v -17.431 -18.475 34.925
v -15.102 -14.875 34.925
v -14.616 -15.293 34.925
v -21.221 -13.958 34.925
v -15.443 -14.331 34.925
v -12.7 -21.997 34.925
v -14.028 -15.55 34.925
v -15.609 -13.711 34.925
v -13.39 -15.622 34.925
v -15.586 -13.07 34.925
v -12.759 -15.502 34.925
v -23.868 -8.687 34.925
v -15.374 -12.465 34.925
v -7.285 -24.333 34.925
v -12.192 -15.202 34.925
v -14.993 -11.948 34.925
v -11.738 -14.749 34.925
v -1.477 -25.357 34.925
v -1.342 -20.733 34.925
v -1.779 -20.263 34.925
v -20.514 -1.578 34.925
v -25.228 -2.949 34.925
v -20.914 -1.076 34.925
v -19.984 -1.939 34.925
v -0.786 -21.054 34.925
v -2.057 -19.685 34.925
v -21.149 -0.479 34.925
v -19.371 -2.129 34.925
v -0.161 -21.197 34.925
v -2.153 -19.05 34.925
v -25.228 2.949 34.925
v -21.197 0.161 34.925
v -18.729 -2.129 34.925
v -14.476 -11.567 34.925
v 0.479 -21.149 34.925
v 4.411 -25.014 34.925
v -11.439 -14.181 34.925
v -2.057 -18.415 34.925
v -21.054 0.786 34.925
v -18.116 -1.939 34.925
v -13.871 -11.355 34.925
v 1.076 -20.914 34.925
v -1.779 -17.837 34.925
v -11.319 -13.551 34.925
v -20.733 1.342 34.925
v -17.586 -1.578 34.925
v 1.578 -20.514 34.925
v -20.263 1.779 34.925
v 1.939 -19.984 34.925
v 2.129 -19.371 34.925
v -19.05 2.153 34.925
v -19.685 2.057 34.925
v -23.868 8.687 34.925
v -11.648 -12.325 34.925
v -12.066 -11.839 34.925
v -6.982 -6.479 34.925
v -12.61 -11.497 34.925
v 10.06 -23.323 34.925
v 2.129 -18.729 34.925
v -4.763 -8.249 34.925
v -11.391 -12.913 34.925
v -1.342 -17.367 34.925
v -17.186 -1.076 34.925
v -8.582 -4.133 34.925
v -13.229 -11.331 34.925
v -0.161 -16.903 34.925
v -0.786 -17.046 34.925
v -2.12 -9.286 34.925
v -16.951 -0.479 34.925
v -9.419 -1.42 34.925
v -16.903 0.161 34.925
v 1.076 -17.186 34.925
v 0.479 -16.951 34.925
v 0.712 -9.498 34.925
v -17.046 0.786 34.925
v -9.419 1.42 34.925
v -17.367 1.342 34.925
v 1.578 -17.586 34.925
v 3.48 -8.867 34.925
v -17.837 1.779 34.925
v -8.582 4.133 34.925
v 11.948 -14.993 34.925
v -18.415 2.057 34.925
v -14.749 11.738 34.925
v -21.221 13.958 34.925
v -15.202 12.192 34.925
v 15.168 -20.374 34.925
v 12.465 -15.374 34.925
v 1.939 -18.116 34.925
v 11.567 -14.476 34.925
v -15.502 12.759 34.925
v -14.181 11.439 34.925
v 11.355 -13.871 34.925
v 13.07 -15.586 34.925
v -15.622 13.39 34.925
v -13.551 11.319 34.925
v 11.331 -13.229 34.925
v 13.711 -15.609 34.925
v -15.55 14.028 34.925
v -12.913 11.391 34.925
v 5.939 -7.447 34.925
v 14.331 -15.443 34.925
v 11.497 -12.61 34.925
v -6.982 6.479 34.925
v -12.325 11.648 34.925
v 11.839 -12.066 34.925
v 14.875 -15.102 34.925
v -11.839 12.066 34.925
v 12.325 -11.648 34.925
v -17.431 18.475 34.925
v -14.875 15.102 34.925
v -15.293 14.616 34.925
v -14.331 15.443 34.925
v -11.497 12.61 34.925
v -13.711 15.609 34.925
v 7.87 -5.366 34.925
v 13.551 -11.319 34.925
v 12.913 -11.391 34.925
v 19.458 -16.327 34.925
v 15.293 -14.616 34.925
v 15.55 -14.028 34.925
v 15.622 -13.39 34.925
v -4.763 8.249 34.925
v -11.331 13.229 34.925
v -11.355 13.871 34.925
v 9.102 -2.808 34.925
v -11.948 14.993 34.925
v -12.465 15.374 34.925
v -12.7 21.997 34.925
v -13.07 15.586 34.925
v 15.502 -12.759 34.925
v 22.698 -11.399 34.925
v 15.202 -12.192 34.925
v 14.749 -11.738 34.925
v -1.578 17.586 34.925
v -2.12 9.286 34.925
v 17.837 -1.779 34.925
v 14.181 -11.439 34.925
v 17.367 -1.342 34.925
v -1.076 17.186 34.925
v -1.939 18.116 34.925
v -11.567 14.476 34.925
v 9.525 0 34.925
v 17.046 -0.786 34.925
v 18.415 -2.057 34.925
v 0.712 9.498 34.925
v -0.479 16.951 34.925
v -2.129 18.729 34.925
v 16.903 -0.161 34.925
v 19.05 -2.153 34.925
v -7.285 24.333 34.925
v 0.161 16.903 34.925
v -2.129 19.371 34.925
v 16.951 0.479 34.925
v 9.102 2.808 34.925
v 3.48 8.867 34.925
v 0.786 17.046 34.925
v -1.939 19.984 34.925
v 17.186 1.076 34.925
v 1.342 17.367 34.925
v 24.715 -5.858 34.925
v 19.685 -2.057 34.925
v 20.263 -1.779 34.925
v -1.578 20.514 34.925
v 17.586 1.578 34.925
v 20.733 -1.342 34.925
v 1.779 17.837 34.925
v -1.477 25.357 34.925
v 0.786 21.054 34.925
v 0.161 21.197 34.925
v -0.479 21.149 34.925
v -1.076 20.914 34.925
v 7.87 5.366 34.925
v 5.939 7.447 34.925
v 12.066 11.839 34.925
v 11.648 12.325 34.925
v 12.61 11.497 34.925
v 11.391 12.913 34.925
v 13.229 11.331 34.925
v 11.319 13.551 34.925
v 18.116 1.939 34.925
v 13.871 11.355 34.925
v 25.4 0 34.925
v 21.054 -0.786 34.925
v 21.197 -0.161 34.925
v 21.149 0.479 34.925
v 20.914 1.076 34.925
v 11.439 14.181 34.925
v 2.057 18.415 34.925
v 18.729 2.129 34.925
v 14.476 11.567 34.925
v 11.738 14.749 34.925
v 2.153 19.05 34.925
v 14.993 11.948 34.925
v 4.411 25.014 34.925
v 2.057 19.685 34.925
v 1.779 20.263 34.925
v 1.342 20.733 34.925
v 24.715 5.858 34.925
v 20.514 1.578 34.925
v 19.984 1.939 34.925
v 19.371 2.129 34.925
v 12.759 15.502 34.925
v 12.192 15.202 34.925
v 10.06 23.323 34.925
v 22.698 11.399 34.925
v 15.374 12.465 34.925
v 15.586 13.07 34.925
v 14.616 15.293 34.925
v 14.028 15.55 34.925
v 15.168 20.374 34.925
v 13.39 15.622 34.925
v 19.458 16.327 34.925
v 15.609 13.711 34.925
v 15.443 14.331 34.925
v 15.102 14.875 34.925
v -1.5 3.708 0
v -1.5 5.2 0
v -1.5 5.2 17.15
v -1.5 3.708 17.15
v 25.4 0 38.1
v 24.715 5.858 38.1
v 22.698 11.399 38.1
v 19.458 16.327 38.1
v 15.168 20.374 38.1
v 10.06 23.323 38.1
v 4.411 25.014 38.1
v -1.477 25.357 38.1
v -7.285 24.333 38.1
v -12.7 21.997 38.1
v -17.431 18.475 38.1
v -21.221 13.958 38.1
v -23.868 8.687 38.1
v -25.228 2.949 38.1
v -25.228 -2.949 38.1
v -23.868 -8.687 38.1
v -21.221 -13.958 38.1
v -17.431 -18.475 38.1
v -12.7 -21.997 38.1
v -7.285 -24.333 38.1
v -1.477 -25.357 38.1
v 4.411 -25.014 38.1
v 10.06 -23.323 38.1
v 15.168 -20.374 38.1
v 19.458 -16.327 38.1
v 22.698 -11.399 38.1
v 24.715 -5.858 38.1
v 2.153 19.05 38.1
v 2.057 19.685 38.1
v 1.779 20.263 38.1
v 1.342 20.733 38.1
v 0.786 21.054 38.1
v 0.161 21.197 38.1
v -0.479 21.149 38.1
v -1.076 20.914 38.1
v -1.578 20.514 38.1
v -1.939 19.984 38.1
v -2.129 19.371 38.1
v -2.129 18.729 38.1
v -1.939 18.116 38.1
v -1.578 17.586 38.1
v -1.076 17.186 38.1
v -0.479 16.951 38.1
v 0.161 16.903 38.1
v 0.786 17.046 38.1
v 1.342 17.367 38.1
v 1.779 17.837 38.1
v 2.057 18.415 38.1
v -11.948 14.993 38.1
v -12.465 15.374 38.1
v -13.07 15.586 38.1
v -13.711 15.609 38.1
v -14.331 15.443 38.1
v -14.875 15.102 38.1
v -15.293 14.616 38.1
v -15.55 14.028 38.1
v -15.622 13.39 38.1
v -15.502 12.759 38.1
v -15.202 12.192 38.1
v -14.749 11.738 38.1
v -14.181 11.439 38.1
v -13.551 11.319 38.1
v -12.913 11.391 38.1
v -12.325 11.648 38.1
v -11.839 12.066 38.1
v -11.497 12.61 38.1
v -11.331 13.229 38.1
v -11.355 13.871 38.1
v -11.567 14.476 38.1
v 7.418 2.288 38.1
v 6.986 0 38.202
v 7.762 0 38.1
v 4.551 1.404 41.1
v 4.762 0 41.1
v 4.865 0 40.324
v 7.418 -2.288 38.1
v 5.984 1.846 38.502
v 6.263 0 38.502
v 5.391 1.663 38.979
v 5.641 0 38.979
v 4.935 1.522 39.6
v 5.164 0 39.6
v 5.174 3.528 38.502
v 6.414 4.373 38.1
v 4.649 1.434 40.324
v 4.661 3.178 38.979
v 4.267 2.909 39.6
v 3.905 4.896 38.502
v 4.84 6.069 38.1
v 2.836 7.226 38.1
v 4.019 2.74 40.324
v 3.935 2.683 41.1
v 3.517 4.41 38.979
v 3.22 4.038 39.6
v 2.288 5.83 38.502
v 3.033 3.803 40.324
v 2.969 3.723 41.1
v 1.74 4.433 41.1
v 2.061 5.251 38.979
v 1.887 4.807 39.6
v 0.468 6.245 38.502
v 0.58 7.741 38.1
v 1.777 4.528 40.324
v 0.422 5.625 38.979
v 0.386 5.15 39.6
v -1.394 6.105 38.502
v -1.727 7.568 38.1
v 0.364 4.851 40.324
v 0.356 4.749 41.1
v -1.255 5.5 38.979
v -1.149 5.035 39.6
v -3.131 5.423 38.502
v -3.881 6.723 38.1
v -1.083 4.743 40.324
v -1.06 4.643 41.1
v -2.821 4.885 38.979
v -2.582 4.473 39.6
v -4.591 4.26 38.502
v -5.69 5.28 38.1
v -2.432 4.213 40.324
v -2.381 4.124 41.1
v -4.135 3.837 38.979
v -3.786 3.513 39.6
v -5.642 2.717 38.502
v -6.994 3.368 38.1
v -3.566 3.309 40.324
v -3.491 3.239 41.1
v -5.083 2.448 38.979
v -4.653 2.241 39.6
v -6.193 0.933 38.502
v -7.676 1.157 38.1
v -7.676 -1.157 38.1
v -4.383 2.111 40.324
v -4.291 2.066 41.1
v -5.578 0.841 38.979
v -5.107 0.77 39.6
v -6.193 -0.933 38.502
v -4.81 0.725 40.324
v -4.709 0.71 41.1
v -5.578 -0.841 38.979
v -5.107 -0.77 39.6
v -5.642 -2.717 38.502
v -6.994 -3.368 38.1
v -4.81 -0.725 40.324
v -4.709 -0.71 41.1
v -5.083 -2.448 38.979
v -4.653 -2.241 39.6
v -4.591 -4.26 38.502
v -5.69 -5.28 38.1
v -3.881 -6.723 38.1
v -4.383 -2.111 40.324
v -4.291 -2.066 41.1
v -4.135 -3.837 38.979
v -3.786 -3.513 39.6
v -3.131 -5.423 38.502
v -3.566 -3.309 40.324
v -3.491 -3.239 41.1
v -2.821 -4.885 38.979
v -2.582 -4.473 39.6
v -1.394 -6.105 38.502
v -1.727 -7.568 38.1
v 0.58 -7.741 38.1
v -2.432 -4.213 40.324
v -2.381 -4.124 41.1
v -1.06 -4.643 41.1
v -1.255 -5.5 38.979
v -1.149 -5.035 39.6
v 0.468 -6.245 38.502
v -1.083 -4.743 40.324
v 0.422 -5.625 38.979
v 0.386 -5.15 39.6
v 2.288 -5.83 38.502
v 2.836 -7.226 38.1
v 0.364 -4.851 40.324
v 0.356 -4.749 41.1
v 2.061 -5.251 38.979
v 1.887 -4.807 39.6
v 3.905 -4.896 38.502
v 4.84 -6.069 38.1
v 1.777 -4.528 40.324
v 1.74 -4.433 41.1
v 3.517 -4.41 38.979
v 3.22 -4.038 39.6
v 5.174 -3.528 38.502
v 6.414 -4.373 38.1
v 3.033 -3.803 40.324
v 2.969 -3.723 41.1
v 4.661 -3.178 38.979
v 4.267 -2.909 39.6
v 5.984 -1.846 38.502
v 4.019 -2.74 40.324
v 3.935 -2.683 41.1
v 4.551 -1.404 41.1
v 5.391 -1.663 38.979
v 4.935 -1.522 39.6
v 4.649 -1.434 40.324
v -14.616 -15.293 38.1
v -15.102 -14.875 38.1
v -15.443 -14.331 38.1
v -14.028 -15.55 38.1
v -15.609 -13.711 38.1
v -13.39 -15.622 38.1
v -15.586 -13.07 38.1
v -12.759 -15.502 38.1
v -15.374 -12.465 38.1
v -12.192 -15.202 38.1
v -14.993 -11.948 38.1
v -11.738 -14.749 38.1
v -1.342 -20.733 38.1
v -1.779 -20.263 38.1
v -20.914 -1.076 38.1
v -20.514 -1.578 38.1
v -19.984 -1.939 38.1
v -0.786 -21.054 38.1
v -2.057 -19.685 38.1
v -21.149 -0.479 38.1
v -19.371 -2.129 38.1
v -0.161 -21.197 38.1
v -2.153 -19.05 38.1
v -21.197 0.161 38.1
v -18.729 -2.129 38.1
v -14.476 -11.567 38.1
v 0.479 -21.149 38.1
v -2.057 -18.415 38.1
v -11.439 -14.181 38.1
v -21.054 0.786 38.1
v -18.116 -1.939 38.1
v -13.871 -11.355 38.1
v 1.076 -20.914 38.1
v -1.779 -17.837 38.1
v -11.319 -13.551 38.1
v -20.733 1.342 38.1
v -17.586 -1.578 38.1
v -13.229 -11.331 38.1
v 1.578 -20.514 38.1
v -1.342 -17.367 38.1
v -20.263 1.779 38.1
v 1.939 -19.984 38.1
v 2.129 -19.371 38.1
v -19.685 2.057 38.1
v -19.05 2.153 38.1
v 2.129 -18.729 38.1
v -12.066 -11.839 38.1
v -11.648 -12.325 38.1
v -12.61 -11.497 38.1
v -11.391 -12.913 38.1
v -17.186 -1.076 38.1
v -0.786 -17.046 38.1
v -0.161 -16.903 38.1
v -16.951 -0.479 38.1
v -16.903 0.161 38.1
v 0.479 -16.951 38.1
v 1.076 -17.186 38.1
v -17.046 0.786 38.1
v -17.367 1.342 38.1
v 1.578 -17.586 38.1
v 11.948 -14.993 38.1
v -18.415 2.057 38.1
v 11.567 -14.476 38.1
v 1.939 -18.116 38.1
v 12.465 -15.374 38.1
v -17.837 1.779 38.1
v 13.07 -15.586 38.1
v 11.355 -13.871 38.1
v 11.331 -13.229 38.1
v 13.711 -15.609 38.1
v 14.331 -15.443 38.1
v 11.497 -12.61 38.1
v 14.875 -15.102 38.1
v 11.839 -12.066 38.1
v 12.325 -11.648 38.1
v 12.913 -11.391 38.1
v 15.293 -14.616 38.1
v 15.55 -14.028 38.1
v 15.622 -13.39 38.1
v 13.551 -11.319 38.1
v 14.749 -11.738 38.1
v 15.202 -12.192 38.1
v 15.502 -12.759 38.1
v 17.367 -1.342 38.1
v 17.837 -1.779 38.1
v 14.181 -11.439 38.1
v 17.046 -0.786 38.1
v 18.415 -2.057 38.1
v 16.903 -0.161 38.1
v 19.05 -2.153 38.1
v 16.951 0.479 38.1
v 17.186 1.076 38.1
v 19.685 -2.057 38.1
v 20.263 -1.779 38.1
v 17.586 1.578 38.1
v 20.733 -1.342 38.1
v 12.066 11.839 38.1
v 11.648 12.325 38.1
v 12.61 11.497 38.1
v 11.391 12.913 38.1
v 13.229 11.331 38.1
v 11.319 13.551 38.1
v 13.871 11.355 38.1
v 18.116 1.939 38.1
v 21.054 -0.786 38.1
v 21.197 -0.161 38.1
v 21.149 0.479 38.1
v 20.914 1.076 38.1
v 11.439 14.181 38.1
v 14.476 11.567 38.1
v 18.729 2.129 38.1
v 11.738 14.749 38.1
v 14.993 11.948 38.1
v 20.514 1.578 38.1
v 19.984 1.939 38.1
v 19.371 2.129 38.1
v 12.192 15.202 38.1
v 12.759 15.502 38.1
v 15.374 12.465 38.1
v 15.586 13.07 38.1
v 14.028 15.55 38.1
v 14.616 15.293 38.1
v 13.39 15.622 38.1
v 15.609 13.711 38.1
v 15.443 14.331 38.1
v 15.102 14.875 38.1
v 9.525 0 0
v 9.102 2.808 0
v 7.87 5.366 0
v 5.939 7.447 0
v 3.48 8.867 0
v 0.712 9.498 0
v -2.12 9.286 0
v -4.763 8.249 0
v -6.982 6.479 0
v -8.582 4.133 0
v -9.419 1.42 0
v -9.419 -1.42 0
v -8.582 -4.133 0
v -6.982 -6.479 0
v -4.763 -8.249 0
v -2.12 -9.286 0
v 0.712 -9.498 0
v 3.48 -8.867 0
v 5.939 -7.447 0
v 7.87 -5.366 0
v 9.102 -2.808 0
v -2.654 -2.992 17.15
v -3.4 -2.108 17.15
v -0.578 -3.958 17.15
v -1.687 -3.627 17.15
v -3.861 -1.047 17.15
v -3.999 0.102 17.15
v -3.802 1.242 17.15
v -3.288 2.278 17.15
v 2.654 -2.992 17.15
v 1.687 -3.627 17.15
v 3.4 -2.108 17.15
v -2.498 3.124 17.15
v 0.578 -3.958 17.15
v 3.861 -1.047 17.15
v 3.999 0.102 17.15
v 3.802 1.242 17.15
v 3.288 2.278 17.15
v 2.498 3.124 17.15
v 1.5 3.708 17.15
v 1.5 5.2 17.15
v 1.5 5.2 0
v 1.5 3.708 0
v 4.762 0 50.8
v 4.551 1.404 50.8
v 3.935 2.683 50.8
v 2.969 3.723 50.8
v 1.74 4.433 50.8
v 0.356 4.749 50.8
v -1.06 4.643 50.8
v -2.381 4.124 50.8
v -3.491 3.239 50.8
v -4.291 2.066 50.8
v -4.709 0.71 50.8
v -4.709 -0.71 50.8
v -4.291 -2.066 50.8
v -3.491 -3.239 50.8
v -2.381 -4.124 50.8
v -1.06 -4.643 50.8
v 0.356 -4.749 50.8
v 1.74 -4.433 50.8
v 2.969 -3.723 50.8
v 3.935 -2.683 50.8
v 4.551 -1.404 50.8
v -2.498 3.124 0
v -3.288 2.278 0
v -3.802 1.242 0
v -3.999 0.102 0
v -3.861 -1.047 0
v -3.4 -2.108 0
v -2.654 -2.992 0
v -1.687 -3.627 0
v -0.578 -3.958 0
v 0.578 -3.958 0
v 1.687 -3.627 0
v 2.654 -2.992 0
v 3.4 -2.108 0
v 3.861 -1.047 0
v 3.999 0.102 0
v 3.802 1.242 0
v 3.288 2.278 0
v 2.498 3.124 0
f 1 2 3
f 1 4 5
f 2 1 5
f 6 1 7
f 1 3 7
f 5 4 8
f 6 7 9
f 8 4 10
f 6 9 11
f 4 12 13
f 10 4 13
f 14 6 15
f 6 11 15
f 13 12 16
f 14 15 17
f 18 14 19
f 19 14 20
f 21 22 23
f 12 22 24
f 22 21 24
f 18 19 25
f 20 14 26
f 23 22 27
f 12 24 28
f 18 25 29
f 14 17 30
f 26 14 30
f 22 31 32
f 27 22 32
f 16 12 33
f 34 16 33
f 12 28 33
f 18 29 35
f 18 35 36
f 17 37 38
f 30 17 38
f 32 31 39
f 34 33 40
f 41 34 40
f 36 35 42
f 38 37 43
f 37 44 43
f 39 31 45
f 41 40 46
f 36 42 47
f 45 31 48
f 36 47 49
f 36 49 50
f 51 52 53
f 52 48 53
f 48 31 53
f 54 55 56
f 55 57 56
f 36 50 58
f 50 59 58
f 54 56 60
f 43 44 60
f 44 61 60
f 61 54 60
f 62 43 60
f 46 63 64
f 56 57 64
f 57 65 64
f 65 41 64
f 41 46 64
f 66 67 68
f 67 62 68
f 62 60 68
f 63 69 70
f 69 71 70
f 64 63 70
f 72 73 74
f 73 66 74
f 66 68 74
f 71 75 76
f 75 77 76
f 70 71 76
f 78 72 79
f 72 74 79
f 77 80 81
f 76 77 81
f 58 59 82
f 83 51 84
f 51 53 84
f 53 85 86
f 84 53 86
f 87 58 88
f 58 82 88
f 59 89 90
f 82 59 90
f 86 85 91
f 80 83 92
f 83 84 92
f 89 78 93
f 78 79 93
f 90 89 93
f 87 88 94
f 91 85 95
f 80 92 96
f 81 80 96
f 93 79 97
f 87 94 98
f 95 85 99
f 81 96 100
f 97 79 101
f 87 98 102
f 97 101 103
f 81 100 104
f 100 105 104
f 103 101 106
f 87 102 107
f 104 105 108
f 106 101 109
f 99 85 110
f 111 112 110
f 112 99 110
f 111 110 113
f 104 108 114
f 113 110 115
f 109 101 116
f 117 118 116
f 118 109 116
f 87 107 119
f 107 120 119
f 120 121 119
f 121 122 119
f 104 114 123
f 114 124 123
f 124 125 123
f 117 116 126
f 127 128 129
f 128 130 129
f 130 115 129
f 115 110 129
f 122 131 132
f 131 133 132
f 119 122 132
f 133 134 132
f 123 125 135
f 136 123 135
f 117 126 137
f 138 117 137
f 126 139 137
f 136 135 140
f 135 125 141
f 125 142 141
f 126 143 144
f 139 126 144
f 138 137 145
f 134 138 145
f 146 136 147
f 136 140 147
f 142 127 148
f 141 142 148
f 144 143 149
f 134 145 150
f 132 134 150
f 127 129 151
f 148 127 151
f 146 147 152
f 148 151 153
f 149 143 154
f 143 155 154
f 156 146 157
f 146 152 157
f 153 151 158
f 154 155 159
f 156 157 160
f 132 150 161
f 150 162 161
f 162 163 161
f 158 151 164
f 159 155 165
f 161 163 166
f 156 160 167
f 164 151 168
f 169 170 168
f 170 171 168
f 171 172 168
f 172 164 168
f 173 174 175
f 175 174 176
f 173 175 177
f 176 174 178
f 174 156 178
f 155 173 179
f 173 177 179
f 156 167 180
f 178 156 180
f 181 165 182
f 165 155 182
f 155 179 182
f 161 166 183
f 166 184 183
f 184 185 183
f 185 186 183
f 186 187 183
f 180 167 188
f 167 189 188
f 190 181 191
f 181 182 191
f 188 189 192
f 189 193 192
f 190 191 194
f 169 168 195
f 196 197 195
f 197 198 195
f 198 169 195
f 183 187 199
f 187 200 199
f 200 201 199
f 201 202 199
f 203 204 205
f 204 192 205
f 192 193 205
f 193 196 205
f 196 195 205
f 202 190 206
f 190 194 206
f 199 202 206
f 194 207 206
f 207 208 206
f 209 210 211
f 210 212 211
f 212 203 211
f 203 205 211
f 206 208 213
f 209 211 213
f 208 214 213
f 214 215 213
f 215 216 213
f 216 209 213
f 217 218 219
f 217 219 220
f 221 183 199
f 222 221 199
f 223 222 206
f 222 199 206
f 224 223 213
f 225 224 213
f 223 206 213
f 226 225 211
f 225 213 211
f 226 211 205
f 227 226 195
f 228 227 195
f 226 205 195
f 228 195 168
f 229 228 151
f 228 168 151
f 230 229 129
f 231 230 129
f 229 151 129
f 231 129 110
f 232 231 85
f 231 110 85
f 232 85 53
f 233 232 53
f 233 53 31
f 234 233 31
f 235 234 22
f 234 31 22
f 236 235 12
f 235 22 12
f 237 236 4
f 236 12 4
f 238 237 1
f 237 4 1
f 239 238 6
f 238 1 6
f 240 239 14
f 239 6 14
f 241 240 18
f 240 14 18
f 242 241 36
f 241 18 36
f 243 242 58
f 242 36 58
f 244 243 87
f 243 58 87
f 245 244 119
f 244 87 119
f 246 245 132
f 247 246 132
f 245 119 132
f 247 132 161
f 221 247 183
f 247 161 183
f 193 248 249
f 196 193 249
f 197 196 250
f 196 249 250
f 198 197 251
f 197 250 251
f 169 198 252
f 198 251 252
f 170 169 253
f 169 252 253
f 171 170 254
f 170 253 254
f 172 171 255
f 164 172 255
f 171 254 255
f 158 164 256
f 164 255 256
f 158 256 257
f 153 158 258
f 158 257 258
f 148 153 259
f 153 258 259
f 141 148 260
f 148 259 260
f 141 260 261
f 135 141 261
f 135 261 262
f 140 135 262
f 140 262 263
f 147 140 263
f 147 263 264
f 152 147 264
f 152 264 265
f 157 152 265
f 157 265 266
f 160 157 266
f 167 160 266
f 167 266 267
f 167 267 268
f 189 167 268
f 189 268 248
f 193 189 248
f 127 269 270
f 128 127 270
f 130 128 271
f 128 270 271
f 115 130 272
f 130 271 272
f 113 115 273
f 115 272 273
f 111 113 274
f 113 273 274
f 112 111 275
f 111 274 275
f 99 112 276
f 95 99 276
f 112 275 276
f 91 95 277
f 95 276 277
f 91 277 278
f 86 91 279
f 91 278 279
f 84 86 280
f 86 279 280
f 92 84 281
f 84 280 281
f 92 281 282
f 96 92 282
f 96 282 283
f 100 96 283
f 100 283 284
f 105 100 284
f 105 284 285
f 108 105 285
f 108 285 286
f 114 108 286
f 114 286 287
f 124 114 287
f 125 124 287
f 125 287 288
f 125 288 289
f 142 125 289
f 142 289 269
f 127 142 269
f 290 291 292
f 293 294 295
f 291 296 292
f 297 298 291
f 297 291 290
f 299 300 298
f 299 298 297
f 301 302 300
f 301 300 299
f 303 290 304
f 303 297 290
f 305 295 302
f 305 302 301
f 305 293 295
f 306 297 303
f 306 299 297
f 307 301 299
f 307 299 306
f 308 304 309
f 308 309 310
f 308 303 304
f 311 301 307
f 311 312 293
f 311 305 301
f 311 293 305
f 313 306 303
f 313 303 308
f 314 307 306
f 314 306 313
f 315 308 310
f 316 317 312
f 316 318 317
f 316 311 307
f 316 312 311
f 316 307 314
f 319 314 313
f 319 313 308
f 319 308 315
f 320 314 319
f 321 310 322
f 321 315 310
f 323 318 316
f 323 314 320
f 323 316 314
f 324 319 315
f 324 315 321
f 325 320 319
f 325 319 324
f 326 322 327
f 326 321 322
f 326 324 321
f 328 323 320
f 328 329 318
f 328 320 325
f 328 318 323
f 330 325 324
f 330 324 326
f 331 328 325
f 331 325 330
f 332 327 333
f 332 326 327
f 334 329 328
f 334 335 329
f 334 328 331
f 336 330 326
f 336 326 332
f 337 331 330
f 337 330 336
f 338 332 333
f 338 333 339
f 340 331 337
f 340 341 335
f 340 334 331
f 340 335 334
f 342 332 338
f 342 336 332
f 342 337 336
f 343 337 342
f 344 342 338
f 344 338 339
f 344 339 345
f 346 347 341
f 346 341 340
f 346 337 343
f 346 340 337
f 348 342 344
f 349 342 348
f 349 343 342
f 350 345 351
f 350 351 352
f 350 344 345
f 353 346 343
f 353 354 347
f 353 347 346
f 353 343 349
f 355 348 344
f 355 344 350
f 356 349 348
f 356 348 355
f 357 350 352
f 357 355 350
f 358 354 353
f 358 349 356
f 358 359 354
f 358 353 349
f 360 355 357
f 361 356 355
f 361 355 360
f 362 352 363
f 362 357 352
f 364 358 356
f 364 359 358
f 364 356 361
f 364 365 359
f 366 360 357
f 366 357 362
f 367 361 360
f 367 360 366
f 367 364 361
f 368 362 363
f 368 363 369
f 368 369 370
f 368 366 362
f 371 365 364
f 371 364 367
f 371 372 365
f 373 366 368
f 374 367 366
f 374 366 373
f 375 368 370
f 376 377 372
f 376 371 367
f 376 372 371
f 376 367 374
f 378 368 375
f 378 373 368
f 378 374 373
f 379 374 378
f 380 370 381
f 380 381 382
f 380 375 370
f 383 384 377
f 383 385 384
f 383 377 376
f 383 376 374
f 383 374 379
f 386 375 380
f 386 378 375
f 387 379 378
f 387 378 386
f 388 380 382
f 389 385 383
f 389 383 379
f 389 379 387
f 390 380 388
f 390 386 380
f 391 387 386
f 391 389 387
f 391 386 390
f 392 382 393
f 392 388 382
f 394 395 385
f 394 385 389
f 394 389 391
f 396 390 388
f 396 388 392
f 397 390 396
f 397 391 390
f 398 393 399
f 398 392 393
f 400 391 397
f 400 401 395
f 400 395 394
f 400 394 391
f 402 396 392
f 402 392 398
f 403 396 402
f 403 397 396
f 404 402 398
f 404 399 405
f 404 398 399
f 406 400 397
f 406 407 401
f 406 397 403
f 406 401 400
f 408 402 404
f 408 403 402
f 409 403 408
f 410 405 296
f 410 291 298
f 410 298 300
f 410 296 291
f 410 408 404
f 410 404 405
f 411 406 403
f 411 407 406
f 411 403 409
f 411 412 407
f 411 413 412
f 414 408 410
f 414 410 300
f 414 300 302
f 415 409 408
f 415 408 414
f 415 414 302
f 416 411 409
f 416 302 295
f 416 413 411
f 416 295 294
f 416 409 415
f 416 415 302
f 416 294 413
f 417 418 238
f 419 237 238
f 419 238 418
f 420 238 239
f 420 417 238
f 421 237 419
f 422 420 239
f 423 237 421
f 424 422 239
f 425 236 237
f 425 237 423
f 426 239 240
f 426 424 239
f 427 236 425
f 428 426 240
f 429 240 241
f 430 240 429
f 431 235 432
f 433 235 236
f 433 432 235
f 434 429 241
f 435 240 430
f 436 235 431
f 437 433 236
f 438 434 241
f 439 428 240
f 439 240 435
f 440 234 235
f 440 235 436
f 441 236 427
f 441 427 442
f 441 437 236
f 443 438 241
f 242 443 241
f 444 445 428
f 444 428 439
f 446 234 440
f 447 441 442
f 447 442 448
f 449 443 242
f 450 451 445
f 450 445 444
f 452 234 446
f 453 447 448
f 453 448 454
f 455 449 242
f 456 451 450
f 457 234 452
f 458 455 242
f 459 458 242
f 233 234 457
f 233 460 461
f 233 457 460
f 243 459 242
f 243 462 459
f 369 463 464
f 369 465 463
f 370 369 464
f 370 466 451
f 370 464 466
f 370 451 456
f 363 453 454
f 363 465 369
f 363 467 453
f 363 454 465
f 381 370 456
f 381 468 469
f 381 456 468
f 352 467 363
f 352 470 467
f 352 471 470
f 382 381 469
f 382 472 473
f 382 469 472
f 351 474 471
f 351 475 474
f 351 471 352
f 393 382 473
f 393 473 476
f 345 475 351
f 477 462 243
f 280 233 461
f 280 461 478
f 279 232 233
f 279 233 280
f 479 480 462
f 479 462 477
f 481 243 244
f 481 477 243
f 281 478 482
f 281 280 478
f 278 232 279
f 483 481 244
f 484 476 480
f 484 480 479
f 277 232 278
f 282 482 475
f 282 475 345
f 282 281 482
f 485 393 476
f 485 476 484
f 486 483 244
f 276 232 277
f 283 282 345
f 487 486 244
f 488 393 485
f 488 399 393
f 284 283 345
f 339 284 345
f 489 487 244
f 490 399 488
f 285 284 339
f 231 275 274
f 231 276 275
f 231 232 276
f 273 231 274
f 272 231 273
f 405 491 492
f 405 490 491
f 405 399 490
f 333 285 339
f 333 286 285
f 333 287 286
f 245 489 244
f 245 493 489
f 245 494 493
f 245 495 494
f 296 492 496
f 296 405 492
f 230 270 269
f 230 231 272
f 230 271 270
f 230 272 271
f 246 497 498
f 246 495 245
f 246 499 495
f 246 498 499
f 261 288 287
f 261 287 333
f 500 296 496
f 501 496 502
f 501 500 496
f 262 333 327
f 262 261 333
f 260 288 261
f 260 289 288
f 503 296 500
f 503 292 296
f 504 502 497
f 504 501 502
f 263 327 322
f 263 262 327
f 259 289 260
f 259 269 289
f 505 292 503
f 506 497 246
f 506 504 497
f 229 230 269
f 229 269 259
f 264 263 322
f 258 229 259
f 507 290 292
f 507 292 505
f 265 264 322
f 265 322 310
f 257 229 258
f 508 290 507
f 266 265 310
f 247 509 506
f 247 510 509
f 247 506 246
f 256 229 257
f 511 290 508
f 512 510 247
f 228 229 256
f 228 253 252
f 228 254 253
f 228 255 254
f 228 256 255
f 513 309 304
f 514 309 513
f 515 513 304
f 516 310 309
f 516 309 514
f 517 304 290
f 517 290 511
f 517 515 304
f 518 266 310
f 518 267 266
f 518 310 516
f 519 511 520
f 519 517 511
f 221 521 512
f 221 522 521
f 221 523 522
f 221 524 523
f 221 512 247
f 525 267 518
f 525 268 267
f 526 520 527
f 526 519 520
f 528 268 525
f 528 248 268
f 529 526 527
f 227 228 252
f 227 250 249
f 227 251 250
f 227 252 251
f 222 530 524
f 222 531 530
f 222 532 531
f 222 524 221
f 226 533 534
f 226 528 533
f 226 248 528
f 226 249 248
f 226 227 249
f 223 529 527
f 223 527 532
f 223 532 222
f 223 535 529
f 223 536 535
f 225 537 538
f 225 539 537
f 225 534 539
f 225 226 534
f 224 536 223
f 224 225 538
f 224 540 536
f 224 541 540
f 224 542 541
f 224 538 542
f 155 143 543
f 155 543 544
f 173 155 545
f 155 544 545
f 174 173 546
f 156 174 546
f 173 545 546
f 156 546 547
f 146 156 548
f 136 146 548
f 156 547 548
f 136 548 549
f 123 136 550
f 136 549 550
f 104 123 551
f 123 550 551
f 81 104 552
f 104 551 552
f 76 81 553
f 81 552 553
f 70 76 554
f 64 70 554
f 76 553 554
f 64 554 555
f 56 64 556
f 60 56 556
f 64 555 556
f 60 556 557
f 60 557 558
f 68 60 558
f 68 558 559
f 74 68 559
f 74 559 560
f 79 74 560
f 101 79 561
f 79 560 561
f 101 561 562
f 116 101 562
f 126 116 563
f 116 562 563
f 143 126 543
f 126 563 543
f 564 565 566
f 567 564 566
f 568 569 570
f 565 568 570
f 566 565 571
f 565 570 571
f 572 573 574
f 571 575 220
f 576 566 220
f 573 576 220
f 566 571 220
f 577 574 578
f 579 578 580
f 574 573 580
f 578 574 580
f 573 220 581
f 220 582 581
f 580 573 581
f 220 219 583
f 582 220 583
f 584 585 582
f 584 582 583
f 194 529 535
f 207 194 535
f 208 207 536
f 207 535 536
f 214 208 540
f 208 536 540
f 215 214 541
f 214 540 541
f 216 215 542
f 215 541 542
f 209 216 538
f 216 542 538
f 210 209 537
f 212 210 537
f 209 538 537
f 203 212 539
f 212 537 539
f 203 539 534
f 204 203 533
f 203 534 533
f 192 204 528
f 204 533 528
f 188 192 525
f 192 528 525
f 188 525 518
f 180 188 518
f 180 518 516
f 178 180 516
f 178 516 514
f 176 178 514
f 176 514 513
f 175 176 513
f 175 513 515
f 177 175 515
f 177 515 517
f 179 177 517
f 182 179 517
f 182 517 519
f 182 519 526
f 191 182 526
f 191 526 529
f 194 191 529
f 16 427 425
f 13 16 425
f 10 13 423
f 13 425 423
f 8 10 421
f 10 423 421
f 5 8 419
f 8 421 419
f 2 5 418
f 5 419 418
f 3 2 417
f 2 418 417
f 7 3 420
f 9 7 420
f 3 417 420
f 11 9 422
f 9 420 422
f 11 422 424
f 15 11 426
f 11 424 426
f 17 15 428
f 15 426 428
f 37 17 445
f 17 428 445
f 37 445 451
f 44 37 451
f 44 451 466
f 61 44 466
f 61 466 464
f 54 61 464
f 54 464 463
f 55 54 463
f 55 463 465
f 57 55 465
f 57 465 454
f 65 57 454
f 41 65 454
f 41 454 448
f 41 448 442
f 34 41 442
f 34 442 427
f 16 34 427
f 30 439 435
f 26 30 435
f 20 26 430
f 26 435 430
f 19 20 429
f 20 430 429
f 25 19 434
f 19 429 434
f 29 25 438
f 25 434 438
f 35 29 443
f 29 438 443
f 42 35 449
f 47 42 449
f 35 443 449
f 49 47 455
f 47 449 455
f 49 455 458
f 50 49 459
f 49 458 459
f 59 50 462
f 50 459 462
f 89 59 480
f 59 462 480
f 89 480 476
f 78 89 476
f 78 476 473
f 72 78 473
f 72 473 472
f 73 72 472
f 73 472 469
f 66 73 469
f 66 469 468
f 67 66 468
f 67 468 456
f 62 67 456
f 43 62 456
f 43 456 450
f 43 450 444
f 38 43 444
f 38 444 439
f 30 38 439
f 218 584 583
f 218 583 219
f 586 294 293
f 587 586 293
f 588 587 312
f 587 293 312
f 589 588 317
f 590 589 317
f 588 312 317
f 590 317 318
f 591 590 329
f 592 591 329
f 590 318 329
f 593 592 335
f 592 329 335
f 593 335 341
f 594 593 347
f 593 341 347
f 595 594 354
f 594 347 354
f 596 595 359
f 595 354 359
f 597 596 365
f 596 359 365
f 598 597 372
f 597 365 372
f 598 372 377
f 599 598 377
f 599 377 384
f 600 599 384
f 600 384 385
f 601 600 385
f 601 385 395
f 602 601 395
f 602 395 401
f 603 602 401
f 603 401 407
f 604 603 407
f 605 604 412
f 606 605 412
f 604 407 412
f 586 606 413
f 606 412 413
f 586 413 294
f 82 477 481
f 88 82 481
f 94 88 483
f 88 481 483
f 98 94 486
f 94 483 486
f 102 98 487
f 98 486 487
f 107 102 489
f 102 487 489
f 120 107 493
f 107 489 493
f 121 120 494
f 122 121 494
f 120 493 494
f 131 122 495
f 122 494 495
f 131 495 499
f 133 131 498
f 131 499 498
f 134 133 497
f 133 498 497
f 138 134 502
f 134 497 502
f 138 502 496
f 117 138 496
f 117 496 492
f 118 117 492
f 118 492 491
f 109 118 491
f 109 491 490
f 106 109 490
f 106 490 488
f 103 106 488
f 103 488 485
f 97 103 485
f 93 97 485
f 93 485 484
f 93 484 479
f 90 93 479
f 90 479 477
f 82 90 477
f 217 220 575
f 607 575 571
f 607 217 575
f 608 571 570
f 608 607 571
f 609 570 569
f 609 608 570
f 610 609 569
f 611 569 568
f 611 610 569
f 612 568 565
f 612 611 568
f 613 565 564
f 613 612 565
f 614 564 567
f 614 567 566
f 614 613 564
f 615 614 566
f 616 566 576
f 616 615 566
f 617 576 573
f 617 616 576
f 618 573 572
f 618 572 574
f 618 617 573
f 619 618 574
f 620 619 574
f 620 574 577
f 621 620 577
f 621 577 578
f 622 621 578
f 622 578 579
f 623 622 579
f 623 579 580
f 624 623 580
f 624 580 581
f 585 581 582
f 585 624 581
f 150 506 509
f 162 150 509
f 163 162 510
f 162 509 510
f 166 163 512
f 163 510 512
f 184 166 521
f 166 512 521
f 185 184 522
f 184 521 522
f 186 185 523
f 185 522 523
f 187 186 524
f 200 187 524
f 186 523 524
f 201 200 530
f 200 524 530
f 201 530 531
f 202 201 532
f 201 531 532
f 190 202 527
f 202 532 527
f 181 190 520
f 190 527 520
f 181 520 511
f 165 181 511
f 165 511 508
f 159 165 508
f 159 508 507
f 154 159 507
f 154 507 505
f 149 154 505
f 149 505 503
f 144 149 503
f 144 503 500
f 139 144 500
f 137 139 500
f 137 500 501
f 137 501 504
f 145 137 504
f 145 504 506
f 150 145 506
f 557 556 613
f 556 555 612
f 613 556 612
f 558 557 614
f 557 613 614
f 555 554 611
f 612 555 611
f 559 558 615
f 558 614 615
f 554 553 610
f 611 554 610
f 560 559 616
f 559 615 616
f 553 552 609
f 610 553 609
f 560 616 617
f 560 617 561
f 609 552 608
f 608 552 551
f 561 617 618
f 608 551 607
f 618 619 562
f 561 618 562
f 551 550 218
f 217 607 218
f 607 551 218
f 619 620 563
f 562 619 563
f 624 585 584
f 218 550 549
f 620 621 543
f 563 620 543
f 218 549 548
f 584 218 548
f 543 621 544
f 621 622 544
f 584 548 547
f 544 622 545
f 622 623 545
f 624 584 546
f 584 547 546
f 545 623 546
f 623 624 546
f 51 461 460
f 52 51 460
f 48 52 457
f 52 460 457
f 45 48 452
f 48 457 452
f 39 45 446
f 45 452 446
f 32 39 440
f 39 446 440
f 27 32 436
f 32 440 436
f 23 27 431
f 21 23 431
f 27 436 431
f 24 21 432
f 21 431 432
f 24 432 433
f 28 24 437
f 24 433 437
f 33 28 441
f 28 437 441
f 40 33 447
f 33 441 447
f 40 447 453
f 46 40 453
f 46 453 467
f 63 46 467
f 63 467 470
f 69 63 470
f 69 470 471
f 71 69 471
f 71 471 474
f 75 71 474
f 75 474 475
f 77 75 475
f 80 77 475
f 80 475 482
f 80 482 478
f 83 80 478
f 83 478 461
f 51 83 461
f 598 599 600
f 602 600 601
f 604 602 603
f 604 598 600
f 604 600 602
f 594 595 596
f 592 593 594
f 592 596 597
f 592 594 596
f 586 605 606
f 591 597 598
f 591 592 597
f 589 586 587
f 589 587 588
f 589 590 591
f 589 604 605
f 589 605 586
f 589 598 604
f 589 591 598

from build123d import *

# Parameters (mm, degrees)
SKETCH1_R                                       = 9.525
BOSS_EXTRUDE1_DEPTH                             = 34.925
SKETCH2_R                                       = 25.4
BOSS_EXTRUDE2_DEPTH                             = 3.175
SKETCH3_R                                       = 4.7625
BOSS_EXTRUDE3_DEPTH                             = 12.7
SKETCH4_R                                       = 2.15265
CUT_EXTRUDE1_DEPTH                              = 19.05
CIRPATTERN1_COUNT                               = 8
FILLET1_R                                       = 3
F_16_6MMFORKEYWAYDEPTHAND_6MMFOREXTRA_375_DEPTH = 17.1500038


with BuildPart() as part:
    # Sketch1 → Boss-Extrude1 (new body)
    with BuildSketch(Plane.XY):
        Circle(SKETCH1_R)
    extrude(amount=BOSS_EXTRUDE1_DEPTH)

    # Sketch2 → Boss-Extrude2 (add)
    with BuildSketch(Plane.XY.offset(34.925)):
        Circle(SKETCH2_R)
    extrude(amount=BOSS_EXTRUDE2_DEPTH)

    # Sketch3 → Boss-Extrude3 (add)
    with BuildSketch(Plane.XY.offset(38.1)):
        Circle(SKETCH3_R)
    extrude(amount=BOSS_EXTRUDE3_DEPTH)

    # Sketch4 → Cut-Extrude1 (cut)
    with BuildSketch(Plane.XY.offset(38.1)):
        with Locations((0, 19.05)):
            Circle(SKETCH4_R)
    cut_extrude1 = extrude(amount=-CUT_EXTRUDE1_DEPTH, mode=Mode.SUBTRACT)

    # CirPattern1: Cut-Extrude1 ×8 about axis
    cirpattern1_axis = Axis((0, 0, 0), (0, 0, 1))
    for i in range(1, CIRPATTERN1_COUNT):
        add(cut_extrude1.rotate(cirpattern1_axis, i * 360 / CIRPATTERN1_COUNT), mode=Mode.SUBTRACT)

    # Fillet1
    fillet1_edges = [part.edges().sort_by_distance(p)[0] for p in [
        (-4.7625, 0, 38.1),
    ]]
    fillet(fillet1_edges, radius=FILLET1_R)

    # Sketch5 → 16.6mmForKeywayDepthand.6mmForExtra.375 (cut)
    with BuildSketch(Plane(origin=(0, 0, 0), x_dir=(-1, 0, 0), z_dir=(0, 0, -1))):
        with BuildLine():
            Line((-1.5, 5.2), (1.5, 5.2))
            Line((1.5, 5.2), (1.5, 3.708099244))
            ThreePointArc((1.5, 3.708099244), (0, -4), (-1.5, 3.708099244))
            Line((-1.5, 3.708099244), (-1.5, 5.2))
        make_face()
    extrude(amount=-F_16_6MMFORKEYWAYDEPTHAND_6MMFOREXTRA_375_DEPTH, mode=Mode.SUBTRACT)


solid = part.part
